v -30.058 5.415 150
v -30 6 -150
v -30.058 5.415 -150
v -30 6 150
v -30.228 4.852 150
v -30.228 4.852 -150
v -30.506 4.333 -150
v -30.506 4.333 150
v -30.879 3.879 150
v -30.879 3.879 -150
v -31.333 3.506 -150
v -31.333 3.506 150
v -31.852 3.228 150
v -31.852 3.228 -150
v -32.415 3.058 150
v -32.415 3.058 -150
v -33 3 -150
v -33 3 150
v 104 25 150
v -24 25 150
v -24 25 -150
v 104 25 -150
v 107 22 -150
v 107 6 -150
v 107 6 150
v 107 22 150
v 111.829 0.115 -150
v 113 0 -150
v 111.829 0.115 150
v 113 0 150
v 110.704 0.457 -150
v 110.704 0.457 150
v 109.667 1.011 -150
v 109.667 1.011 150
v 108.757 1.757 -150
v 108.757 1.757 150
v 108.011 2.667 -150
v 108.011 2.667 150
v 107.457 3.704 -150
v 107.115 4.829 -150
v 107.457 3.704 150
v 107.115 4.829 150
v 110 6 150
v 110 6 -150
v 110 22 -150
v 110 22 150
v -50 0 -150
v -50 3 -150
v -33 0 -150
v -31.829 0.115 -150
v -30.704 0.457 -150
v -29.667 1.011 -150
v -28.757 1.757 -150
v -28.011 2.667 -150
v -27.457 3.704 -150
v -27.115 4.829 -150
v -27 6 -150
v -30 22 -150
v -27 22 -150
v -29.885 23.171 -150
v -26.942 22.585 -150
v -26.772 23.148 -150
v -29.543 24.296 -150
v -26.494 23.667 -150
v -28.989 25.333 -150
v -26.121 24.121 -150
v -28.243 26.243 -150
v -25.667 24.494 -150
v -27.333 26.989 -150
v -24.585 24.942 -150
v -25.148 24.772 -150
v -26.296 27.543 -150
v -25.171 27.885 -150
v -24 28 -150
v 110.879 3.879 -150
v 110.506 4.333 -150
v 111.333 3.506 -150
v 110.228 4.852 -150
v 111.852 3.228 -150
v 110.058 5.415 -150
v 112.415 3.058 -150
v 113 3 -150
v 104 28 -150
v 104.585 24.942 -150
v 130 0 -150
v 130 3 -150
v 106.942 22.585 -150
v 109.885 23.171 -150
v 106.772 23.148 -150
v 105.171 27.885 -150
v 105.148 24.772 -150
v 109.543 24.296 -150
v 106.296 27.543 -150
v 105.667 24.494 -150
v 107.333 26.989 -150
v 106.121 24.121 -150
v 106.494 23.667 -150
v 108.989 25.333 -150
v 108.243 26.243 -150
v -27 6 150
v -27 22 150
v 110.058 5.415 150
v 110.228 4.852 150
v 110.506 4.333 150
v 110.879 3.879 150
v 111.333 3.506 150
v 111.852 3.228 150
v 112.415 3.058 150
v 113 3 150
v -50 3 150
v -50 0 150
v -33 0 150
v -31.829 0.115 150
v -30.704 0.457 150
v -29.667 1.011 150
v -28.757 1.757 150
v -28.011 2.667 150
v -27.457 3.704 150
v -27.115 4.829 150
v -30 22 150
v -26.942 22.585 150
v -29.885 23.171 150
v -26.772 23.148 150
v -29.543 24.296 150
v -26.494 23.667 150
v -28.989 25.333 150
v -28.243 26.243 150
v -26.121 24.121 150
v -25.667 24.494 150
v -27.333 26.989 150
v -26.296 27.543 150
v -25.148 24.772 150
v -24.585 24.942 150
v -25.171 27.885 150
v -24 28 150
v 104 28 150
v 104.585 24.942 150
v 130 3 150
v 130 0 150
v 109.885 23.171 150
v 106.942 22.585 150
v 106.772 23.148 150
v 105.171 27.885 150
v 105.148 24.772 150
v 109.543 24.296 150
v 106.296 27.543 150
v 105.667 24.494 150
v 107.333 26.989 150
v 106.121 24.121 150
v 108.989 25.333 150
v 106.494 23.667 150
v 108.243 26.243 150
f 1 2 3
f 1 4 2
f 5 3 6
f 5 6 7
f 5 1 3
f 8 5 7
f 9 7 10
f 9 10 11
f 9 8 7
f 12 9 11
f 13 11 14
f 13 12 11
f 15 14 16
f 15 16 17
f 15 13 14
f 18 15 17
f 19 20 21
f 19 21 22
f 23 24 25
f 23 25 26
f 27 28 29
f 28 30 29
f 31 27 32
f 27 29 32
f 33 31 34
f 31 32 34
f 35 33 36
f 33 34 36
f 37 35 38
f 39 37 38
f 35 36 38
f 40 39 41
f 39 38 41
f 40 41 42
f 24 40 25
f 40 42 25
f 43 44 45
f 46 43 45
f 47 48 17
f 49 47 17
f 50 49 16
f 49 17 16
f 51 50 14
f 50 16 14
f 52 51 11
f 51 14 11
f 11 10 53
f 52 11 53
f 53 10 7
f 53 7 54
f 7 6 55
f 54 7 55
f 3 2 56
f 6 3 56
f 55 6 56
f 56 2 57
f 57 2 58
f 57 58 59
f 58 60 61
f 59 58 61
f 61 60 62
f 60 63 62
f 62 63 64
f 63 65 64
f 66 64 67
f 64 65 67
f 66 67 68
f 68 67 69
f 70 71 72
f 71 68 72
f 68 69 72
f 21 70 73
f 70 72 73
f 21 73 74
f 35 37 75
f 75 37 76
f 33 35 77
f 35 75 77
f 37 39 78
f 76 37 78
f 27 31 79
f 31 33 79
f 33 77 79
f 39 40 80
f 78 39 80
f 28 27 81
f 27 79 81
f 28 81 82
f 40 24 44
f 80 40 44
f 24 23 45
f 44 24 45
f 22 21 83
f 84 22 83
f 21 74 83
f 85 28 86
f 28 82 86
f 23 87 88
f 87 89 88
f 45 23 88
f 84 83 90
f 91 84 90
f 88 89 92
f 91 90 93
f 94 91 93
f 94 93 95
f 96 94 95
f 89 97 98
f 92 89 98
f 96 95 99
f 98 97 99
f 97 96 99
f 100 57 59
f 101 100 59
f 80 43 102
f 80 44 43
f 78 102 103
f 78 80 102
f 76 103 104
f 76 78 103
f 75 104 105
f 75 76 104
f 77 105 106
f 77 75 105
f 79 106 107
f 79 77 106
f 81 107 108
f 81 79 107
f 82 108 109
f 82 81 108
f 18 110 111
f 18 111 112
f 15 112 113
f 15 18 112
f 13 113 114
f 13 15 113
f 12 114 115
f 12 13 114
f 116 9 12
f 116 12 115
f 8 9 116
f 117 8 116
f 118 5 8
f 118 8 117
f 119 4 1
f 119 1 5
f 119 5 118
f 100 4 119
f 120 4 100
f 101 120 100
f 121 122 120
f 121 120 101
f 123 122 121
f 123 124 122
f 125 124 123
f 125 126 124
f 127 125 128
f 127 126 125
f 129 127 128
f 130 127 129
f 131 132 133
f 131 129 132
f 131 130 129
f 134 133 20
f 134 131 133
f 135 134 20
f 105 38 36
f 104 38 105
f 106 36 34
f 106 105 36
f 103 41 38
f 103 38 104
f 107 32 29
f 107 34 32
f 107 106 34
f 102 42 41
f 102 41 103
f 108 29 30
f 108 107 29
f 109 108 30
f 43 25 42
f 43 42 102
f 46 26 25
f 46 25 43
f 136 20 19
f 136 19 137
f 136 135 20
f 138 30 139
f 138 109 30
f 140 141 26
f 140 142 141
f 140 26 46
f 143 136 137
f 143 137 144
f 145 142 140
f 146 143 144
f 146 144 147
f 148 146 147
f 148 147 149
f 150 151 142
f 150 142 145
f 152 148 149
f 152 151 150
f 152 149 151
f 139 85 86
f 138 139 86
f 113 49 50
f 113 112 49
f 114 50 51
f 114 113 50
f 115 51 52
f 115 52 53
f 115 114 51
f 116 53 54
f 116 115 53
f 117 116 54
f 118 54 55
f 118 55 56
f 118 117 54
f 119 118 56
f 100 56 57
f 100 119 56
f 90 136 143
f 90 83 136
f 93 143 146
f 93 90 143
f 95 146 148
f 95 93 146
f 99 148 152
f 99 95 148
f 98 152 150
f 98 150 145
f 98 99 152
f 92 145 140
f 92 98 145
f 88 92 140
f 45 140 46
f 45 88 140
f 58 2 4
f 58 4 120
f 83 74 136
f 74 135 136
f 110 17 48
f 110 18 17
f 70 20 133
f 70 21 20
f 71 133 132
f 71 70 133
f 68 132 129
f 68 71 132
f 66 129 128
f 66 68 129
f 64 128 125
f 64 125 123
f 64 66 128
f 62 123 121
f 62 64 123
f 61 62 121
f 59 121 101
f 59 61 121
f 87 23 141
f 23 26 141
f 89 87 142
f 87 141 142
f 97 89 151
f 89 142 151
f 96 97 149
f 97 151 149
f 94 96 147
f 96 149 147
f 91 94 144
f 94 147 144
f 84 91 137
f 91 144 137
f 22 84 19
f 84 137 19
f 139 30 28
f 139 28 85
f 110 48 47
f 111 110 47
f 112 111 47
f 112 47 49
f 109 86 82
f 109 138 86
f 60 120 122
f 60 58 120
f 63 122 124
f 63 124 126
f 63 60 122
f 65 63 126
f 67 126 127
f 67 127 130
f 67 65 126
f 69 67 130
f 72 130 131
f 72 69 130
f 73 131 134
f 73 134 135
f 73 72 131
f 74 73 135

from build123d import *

# Parameters (mm, degrees)
F0_W        = 140
F0_H        = 25
F1_DEPTH    = 150
F2_T        = 3
F2_T3_DEPTH = 306
F3_R        = 3
F4_R        = 6


# Not quite as in the source:
# - a shell that OpenCascade refuses in one call is made with other operations: the cavity is built on its own and cut out


with BuildPart() as f1:
    # F0 (on Top) → F1 (new body, symmetric)
    with BuildSketch(Plane.XY):
        with Locations((40, 15.5)):
            Rectangle(F0_W, F0_H)
        Polygon((110, 3), (-30, 3), (-50, 3), (-50, 0), (130, 0), (130, 3), align=None)
    extrude(amount=F1_DEPTH, both=True)

    # F2: shell of thickness 3, made by hand


with BuildPart() as f2_core1:
    # F2_t2: copy of F1
    add(f1.part)

    # the walls: a layer under each face that stays
    f2_faces = [f2_core1.faces().sort_by_distance(p)[0] for p in [
        (-30, 15.5, 0),
        (40, 28, 0),
        (110, 15.5, 0),
        (120, 3, 0),
        (130, 1.5, 0),
        (-50, 1.5, 0),
        (-40, 3, 0),
    ]]
    thicken(f2_faces, amount=-F2_T, mode=Mode.SUBTRACT)

    # F2_s4 → F2_t3 (cut)
    with BuildSketch(Plane.XY.offset(-153)):
        Polygon((-30.03, 3.03), (-27, 3), (-27, 0), (-30, 0), align=None)
        Polygon((110.03, 3.03), (107, 3), (107, 0), (110, 0), align=None)
    extrude(amount=F2_T3_DEPTH, mode=Mode.SUBTRACT)


with BuildPart() as f1_1:
    add(f1.part)

    # what is left inside the walls is the cavity
    f2_cavity = [f2_core1.part.solids().sort_by_distance(p)[0] for p in [
        (40, 0.03, -50),
    ]]
    add(f2_cavity, mode=Mode.SUBTRACT)

    # F3
    f3_edges = [f1_1.edges().sort_by_distance(p)[0] for p in [
        (-30, 3, 0),
        (110, 3, 0),
        (-27, 25, 0),
        (107, 25, 0),
    ]]
    fillet(f3_edges, radius=F3_R)

    # F4
    f4_edges = [f1_1.edges().sort_by_distance(p)[0] for p in [
        (-27, 0, 0),
        (107, 0, 0),
        (-30, 28, 0),
        (110, 28, 0),
    ]]
    fillet(f4_edges, radius=F4_R)


solid = f1_1.part
